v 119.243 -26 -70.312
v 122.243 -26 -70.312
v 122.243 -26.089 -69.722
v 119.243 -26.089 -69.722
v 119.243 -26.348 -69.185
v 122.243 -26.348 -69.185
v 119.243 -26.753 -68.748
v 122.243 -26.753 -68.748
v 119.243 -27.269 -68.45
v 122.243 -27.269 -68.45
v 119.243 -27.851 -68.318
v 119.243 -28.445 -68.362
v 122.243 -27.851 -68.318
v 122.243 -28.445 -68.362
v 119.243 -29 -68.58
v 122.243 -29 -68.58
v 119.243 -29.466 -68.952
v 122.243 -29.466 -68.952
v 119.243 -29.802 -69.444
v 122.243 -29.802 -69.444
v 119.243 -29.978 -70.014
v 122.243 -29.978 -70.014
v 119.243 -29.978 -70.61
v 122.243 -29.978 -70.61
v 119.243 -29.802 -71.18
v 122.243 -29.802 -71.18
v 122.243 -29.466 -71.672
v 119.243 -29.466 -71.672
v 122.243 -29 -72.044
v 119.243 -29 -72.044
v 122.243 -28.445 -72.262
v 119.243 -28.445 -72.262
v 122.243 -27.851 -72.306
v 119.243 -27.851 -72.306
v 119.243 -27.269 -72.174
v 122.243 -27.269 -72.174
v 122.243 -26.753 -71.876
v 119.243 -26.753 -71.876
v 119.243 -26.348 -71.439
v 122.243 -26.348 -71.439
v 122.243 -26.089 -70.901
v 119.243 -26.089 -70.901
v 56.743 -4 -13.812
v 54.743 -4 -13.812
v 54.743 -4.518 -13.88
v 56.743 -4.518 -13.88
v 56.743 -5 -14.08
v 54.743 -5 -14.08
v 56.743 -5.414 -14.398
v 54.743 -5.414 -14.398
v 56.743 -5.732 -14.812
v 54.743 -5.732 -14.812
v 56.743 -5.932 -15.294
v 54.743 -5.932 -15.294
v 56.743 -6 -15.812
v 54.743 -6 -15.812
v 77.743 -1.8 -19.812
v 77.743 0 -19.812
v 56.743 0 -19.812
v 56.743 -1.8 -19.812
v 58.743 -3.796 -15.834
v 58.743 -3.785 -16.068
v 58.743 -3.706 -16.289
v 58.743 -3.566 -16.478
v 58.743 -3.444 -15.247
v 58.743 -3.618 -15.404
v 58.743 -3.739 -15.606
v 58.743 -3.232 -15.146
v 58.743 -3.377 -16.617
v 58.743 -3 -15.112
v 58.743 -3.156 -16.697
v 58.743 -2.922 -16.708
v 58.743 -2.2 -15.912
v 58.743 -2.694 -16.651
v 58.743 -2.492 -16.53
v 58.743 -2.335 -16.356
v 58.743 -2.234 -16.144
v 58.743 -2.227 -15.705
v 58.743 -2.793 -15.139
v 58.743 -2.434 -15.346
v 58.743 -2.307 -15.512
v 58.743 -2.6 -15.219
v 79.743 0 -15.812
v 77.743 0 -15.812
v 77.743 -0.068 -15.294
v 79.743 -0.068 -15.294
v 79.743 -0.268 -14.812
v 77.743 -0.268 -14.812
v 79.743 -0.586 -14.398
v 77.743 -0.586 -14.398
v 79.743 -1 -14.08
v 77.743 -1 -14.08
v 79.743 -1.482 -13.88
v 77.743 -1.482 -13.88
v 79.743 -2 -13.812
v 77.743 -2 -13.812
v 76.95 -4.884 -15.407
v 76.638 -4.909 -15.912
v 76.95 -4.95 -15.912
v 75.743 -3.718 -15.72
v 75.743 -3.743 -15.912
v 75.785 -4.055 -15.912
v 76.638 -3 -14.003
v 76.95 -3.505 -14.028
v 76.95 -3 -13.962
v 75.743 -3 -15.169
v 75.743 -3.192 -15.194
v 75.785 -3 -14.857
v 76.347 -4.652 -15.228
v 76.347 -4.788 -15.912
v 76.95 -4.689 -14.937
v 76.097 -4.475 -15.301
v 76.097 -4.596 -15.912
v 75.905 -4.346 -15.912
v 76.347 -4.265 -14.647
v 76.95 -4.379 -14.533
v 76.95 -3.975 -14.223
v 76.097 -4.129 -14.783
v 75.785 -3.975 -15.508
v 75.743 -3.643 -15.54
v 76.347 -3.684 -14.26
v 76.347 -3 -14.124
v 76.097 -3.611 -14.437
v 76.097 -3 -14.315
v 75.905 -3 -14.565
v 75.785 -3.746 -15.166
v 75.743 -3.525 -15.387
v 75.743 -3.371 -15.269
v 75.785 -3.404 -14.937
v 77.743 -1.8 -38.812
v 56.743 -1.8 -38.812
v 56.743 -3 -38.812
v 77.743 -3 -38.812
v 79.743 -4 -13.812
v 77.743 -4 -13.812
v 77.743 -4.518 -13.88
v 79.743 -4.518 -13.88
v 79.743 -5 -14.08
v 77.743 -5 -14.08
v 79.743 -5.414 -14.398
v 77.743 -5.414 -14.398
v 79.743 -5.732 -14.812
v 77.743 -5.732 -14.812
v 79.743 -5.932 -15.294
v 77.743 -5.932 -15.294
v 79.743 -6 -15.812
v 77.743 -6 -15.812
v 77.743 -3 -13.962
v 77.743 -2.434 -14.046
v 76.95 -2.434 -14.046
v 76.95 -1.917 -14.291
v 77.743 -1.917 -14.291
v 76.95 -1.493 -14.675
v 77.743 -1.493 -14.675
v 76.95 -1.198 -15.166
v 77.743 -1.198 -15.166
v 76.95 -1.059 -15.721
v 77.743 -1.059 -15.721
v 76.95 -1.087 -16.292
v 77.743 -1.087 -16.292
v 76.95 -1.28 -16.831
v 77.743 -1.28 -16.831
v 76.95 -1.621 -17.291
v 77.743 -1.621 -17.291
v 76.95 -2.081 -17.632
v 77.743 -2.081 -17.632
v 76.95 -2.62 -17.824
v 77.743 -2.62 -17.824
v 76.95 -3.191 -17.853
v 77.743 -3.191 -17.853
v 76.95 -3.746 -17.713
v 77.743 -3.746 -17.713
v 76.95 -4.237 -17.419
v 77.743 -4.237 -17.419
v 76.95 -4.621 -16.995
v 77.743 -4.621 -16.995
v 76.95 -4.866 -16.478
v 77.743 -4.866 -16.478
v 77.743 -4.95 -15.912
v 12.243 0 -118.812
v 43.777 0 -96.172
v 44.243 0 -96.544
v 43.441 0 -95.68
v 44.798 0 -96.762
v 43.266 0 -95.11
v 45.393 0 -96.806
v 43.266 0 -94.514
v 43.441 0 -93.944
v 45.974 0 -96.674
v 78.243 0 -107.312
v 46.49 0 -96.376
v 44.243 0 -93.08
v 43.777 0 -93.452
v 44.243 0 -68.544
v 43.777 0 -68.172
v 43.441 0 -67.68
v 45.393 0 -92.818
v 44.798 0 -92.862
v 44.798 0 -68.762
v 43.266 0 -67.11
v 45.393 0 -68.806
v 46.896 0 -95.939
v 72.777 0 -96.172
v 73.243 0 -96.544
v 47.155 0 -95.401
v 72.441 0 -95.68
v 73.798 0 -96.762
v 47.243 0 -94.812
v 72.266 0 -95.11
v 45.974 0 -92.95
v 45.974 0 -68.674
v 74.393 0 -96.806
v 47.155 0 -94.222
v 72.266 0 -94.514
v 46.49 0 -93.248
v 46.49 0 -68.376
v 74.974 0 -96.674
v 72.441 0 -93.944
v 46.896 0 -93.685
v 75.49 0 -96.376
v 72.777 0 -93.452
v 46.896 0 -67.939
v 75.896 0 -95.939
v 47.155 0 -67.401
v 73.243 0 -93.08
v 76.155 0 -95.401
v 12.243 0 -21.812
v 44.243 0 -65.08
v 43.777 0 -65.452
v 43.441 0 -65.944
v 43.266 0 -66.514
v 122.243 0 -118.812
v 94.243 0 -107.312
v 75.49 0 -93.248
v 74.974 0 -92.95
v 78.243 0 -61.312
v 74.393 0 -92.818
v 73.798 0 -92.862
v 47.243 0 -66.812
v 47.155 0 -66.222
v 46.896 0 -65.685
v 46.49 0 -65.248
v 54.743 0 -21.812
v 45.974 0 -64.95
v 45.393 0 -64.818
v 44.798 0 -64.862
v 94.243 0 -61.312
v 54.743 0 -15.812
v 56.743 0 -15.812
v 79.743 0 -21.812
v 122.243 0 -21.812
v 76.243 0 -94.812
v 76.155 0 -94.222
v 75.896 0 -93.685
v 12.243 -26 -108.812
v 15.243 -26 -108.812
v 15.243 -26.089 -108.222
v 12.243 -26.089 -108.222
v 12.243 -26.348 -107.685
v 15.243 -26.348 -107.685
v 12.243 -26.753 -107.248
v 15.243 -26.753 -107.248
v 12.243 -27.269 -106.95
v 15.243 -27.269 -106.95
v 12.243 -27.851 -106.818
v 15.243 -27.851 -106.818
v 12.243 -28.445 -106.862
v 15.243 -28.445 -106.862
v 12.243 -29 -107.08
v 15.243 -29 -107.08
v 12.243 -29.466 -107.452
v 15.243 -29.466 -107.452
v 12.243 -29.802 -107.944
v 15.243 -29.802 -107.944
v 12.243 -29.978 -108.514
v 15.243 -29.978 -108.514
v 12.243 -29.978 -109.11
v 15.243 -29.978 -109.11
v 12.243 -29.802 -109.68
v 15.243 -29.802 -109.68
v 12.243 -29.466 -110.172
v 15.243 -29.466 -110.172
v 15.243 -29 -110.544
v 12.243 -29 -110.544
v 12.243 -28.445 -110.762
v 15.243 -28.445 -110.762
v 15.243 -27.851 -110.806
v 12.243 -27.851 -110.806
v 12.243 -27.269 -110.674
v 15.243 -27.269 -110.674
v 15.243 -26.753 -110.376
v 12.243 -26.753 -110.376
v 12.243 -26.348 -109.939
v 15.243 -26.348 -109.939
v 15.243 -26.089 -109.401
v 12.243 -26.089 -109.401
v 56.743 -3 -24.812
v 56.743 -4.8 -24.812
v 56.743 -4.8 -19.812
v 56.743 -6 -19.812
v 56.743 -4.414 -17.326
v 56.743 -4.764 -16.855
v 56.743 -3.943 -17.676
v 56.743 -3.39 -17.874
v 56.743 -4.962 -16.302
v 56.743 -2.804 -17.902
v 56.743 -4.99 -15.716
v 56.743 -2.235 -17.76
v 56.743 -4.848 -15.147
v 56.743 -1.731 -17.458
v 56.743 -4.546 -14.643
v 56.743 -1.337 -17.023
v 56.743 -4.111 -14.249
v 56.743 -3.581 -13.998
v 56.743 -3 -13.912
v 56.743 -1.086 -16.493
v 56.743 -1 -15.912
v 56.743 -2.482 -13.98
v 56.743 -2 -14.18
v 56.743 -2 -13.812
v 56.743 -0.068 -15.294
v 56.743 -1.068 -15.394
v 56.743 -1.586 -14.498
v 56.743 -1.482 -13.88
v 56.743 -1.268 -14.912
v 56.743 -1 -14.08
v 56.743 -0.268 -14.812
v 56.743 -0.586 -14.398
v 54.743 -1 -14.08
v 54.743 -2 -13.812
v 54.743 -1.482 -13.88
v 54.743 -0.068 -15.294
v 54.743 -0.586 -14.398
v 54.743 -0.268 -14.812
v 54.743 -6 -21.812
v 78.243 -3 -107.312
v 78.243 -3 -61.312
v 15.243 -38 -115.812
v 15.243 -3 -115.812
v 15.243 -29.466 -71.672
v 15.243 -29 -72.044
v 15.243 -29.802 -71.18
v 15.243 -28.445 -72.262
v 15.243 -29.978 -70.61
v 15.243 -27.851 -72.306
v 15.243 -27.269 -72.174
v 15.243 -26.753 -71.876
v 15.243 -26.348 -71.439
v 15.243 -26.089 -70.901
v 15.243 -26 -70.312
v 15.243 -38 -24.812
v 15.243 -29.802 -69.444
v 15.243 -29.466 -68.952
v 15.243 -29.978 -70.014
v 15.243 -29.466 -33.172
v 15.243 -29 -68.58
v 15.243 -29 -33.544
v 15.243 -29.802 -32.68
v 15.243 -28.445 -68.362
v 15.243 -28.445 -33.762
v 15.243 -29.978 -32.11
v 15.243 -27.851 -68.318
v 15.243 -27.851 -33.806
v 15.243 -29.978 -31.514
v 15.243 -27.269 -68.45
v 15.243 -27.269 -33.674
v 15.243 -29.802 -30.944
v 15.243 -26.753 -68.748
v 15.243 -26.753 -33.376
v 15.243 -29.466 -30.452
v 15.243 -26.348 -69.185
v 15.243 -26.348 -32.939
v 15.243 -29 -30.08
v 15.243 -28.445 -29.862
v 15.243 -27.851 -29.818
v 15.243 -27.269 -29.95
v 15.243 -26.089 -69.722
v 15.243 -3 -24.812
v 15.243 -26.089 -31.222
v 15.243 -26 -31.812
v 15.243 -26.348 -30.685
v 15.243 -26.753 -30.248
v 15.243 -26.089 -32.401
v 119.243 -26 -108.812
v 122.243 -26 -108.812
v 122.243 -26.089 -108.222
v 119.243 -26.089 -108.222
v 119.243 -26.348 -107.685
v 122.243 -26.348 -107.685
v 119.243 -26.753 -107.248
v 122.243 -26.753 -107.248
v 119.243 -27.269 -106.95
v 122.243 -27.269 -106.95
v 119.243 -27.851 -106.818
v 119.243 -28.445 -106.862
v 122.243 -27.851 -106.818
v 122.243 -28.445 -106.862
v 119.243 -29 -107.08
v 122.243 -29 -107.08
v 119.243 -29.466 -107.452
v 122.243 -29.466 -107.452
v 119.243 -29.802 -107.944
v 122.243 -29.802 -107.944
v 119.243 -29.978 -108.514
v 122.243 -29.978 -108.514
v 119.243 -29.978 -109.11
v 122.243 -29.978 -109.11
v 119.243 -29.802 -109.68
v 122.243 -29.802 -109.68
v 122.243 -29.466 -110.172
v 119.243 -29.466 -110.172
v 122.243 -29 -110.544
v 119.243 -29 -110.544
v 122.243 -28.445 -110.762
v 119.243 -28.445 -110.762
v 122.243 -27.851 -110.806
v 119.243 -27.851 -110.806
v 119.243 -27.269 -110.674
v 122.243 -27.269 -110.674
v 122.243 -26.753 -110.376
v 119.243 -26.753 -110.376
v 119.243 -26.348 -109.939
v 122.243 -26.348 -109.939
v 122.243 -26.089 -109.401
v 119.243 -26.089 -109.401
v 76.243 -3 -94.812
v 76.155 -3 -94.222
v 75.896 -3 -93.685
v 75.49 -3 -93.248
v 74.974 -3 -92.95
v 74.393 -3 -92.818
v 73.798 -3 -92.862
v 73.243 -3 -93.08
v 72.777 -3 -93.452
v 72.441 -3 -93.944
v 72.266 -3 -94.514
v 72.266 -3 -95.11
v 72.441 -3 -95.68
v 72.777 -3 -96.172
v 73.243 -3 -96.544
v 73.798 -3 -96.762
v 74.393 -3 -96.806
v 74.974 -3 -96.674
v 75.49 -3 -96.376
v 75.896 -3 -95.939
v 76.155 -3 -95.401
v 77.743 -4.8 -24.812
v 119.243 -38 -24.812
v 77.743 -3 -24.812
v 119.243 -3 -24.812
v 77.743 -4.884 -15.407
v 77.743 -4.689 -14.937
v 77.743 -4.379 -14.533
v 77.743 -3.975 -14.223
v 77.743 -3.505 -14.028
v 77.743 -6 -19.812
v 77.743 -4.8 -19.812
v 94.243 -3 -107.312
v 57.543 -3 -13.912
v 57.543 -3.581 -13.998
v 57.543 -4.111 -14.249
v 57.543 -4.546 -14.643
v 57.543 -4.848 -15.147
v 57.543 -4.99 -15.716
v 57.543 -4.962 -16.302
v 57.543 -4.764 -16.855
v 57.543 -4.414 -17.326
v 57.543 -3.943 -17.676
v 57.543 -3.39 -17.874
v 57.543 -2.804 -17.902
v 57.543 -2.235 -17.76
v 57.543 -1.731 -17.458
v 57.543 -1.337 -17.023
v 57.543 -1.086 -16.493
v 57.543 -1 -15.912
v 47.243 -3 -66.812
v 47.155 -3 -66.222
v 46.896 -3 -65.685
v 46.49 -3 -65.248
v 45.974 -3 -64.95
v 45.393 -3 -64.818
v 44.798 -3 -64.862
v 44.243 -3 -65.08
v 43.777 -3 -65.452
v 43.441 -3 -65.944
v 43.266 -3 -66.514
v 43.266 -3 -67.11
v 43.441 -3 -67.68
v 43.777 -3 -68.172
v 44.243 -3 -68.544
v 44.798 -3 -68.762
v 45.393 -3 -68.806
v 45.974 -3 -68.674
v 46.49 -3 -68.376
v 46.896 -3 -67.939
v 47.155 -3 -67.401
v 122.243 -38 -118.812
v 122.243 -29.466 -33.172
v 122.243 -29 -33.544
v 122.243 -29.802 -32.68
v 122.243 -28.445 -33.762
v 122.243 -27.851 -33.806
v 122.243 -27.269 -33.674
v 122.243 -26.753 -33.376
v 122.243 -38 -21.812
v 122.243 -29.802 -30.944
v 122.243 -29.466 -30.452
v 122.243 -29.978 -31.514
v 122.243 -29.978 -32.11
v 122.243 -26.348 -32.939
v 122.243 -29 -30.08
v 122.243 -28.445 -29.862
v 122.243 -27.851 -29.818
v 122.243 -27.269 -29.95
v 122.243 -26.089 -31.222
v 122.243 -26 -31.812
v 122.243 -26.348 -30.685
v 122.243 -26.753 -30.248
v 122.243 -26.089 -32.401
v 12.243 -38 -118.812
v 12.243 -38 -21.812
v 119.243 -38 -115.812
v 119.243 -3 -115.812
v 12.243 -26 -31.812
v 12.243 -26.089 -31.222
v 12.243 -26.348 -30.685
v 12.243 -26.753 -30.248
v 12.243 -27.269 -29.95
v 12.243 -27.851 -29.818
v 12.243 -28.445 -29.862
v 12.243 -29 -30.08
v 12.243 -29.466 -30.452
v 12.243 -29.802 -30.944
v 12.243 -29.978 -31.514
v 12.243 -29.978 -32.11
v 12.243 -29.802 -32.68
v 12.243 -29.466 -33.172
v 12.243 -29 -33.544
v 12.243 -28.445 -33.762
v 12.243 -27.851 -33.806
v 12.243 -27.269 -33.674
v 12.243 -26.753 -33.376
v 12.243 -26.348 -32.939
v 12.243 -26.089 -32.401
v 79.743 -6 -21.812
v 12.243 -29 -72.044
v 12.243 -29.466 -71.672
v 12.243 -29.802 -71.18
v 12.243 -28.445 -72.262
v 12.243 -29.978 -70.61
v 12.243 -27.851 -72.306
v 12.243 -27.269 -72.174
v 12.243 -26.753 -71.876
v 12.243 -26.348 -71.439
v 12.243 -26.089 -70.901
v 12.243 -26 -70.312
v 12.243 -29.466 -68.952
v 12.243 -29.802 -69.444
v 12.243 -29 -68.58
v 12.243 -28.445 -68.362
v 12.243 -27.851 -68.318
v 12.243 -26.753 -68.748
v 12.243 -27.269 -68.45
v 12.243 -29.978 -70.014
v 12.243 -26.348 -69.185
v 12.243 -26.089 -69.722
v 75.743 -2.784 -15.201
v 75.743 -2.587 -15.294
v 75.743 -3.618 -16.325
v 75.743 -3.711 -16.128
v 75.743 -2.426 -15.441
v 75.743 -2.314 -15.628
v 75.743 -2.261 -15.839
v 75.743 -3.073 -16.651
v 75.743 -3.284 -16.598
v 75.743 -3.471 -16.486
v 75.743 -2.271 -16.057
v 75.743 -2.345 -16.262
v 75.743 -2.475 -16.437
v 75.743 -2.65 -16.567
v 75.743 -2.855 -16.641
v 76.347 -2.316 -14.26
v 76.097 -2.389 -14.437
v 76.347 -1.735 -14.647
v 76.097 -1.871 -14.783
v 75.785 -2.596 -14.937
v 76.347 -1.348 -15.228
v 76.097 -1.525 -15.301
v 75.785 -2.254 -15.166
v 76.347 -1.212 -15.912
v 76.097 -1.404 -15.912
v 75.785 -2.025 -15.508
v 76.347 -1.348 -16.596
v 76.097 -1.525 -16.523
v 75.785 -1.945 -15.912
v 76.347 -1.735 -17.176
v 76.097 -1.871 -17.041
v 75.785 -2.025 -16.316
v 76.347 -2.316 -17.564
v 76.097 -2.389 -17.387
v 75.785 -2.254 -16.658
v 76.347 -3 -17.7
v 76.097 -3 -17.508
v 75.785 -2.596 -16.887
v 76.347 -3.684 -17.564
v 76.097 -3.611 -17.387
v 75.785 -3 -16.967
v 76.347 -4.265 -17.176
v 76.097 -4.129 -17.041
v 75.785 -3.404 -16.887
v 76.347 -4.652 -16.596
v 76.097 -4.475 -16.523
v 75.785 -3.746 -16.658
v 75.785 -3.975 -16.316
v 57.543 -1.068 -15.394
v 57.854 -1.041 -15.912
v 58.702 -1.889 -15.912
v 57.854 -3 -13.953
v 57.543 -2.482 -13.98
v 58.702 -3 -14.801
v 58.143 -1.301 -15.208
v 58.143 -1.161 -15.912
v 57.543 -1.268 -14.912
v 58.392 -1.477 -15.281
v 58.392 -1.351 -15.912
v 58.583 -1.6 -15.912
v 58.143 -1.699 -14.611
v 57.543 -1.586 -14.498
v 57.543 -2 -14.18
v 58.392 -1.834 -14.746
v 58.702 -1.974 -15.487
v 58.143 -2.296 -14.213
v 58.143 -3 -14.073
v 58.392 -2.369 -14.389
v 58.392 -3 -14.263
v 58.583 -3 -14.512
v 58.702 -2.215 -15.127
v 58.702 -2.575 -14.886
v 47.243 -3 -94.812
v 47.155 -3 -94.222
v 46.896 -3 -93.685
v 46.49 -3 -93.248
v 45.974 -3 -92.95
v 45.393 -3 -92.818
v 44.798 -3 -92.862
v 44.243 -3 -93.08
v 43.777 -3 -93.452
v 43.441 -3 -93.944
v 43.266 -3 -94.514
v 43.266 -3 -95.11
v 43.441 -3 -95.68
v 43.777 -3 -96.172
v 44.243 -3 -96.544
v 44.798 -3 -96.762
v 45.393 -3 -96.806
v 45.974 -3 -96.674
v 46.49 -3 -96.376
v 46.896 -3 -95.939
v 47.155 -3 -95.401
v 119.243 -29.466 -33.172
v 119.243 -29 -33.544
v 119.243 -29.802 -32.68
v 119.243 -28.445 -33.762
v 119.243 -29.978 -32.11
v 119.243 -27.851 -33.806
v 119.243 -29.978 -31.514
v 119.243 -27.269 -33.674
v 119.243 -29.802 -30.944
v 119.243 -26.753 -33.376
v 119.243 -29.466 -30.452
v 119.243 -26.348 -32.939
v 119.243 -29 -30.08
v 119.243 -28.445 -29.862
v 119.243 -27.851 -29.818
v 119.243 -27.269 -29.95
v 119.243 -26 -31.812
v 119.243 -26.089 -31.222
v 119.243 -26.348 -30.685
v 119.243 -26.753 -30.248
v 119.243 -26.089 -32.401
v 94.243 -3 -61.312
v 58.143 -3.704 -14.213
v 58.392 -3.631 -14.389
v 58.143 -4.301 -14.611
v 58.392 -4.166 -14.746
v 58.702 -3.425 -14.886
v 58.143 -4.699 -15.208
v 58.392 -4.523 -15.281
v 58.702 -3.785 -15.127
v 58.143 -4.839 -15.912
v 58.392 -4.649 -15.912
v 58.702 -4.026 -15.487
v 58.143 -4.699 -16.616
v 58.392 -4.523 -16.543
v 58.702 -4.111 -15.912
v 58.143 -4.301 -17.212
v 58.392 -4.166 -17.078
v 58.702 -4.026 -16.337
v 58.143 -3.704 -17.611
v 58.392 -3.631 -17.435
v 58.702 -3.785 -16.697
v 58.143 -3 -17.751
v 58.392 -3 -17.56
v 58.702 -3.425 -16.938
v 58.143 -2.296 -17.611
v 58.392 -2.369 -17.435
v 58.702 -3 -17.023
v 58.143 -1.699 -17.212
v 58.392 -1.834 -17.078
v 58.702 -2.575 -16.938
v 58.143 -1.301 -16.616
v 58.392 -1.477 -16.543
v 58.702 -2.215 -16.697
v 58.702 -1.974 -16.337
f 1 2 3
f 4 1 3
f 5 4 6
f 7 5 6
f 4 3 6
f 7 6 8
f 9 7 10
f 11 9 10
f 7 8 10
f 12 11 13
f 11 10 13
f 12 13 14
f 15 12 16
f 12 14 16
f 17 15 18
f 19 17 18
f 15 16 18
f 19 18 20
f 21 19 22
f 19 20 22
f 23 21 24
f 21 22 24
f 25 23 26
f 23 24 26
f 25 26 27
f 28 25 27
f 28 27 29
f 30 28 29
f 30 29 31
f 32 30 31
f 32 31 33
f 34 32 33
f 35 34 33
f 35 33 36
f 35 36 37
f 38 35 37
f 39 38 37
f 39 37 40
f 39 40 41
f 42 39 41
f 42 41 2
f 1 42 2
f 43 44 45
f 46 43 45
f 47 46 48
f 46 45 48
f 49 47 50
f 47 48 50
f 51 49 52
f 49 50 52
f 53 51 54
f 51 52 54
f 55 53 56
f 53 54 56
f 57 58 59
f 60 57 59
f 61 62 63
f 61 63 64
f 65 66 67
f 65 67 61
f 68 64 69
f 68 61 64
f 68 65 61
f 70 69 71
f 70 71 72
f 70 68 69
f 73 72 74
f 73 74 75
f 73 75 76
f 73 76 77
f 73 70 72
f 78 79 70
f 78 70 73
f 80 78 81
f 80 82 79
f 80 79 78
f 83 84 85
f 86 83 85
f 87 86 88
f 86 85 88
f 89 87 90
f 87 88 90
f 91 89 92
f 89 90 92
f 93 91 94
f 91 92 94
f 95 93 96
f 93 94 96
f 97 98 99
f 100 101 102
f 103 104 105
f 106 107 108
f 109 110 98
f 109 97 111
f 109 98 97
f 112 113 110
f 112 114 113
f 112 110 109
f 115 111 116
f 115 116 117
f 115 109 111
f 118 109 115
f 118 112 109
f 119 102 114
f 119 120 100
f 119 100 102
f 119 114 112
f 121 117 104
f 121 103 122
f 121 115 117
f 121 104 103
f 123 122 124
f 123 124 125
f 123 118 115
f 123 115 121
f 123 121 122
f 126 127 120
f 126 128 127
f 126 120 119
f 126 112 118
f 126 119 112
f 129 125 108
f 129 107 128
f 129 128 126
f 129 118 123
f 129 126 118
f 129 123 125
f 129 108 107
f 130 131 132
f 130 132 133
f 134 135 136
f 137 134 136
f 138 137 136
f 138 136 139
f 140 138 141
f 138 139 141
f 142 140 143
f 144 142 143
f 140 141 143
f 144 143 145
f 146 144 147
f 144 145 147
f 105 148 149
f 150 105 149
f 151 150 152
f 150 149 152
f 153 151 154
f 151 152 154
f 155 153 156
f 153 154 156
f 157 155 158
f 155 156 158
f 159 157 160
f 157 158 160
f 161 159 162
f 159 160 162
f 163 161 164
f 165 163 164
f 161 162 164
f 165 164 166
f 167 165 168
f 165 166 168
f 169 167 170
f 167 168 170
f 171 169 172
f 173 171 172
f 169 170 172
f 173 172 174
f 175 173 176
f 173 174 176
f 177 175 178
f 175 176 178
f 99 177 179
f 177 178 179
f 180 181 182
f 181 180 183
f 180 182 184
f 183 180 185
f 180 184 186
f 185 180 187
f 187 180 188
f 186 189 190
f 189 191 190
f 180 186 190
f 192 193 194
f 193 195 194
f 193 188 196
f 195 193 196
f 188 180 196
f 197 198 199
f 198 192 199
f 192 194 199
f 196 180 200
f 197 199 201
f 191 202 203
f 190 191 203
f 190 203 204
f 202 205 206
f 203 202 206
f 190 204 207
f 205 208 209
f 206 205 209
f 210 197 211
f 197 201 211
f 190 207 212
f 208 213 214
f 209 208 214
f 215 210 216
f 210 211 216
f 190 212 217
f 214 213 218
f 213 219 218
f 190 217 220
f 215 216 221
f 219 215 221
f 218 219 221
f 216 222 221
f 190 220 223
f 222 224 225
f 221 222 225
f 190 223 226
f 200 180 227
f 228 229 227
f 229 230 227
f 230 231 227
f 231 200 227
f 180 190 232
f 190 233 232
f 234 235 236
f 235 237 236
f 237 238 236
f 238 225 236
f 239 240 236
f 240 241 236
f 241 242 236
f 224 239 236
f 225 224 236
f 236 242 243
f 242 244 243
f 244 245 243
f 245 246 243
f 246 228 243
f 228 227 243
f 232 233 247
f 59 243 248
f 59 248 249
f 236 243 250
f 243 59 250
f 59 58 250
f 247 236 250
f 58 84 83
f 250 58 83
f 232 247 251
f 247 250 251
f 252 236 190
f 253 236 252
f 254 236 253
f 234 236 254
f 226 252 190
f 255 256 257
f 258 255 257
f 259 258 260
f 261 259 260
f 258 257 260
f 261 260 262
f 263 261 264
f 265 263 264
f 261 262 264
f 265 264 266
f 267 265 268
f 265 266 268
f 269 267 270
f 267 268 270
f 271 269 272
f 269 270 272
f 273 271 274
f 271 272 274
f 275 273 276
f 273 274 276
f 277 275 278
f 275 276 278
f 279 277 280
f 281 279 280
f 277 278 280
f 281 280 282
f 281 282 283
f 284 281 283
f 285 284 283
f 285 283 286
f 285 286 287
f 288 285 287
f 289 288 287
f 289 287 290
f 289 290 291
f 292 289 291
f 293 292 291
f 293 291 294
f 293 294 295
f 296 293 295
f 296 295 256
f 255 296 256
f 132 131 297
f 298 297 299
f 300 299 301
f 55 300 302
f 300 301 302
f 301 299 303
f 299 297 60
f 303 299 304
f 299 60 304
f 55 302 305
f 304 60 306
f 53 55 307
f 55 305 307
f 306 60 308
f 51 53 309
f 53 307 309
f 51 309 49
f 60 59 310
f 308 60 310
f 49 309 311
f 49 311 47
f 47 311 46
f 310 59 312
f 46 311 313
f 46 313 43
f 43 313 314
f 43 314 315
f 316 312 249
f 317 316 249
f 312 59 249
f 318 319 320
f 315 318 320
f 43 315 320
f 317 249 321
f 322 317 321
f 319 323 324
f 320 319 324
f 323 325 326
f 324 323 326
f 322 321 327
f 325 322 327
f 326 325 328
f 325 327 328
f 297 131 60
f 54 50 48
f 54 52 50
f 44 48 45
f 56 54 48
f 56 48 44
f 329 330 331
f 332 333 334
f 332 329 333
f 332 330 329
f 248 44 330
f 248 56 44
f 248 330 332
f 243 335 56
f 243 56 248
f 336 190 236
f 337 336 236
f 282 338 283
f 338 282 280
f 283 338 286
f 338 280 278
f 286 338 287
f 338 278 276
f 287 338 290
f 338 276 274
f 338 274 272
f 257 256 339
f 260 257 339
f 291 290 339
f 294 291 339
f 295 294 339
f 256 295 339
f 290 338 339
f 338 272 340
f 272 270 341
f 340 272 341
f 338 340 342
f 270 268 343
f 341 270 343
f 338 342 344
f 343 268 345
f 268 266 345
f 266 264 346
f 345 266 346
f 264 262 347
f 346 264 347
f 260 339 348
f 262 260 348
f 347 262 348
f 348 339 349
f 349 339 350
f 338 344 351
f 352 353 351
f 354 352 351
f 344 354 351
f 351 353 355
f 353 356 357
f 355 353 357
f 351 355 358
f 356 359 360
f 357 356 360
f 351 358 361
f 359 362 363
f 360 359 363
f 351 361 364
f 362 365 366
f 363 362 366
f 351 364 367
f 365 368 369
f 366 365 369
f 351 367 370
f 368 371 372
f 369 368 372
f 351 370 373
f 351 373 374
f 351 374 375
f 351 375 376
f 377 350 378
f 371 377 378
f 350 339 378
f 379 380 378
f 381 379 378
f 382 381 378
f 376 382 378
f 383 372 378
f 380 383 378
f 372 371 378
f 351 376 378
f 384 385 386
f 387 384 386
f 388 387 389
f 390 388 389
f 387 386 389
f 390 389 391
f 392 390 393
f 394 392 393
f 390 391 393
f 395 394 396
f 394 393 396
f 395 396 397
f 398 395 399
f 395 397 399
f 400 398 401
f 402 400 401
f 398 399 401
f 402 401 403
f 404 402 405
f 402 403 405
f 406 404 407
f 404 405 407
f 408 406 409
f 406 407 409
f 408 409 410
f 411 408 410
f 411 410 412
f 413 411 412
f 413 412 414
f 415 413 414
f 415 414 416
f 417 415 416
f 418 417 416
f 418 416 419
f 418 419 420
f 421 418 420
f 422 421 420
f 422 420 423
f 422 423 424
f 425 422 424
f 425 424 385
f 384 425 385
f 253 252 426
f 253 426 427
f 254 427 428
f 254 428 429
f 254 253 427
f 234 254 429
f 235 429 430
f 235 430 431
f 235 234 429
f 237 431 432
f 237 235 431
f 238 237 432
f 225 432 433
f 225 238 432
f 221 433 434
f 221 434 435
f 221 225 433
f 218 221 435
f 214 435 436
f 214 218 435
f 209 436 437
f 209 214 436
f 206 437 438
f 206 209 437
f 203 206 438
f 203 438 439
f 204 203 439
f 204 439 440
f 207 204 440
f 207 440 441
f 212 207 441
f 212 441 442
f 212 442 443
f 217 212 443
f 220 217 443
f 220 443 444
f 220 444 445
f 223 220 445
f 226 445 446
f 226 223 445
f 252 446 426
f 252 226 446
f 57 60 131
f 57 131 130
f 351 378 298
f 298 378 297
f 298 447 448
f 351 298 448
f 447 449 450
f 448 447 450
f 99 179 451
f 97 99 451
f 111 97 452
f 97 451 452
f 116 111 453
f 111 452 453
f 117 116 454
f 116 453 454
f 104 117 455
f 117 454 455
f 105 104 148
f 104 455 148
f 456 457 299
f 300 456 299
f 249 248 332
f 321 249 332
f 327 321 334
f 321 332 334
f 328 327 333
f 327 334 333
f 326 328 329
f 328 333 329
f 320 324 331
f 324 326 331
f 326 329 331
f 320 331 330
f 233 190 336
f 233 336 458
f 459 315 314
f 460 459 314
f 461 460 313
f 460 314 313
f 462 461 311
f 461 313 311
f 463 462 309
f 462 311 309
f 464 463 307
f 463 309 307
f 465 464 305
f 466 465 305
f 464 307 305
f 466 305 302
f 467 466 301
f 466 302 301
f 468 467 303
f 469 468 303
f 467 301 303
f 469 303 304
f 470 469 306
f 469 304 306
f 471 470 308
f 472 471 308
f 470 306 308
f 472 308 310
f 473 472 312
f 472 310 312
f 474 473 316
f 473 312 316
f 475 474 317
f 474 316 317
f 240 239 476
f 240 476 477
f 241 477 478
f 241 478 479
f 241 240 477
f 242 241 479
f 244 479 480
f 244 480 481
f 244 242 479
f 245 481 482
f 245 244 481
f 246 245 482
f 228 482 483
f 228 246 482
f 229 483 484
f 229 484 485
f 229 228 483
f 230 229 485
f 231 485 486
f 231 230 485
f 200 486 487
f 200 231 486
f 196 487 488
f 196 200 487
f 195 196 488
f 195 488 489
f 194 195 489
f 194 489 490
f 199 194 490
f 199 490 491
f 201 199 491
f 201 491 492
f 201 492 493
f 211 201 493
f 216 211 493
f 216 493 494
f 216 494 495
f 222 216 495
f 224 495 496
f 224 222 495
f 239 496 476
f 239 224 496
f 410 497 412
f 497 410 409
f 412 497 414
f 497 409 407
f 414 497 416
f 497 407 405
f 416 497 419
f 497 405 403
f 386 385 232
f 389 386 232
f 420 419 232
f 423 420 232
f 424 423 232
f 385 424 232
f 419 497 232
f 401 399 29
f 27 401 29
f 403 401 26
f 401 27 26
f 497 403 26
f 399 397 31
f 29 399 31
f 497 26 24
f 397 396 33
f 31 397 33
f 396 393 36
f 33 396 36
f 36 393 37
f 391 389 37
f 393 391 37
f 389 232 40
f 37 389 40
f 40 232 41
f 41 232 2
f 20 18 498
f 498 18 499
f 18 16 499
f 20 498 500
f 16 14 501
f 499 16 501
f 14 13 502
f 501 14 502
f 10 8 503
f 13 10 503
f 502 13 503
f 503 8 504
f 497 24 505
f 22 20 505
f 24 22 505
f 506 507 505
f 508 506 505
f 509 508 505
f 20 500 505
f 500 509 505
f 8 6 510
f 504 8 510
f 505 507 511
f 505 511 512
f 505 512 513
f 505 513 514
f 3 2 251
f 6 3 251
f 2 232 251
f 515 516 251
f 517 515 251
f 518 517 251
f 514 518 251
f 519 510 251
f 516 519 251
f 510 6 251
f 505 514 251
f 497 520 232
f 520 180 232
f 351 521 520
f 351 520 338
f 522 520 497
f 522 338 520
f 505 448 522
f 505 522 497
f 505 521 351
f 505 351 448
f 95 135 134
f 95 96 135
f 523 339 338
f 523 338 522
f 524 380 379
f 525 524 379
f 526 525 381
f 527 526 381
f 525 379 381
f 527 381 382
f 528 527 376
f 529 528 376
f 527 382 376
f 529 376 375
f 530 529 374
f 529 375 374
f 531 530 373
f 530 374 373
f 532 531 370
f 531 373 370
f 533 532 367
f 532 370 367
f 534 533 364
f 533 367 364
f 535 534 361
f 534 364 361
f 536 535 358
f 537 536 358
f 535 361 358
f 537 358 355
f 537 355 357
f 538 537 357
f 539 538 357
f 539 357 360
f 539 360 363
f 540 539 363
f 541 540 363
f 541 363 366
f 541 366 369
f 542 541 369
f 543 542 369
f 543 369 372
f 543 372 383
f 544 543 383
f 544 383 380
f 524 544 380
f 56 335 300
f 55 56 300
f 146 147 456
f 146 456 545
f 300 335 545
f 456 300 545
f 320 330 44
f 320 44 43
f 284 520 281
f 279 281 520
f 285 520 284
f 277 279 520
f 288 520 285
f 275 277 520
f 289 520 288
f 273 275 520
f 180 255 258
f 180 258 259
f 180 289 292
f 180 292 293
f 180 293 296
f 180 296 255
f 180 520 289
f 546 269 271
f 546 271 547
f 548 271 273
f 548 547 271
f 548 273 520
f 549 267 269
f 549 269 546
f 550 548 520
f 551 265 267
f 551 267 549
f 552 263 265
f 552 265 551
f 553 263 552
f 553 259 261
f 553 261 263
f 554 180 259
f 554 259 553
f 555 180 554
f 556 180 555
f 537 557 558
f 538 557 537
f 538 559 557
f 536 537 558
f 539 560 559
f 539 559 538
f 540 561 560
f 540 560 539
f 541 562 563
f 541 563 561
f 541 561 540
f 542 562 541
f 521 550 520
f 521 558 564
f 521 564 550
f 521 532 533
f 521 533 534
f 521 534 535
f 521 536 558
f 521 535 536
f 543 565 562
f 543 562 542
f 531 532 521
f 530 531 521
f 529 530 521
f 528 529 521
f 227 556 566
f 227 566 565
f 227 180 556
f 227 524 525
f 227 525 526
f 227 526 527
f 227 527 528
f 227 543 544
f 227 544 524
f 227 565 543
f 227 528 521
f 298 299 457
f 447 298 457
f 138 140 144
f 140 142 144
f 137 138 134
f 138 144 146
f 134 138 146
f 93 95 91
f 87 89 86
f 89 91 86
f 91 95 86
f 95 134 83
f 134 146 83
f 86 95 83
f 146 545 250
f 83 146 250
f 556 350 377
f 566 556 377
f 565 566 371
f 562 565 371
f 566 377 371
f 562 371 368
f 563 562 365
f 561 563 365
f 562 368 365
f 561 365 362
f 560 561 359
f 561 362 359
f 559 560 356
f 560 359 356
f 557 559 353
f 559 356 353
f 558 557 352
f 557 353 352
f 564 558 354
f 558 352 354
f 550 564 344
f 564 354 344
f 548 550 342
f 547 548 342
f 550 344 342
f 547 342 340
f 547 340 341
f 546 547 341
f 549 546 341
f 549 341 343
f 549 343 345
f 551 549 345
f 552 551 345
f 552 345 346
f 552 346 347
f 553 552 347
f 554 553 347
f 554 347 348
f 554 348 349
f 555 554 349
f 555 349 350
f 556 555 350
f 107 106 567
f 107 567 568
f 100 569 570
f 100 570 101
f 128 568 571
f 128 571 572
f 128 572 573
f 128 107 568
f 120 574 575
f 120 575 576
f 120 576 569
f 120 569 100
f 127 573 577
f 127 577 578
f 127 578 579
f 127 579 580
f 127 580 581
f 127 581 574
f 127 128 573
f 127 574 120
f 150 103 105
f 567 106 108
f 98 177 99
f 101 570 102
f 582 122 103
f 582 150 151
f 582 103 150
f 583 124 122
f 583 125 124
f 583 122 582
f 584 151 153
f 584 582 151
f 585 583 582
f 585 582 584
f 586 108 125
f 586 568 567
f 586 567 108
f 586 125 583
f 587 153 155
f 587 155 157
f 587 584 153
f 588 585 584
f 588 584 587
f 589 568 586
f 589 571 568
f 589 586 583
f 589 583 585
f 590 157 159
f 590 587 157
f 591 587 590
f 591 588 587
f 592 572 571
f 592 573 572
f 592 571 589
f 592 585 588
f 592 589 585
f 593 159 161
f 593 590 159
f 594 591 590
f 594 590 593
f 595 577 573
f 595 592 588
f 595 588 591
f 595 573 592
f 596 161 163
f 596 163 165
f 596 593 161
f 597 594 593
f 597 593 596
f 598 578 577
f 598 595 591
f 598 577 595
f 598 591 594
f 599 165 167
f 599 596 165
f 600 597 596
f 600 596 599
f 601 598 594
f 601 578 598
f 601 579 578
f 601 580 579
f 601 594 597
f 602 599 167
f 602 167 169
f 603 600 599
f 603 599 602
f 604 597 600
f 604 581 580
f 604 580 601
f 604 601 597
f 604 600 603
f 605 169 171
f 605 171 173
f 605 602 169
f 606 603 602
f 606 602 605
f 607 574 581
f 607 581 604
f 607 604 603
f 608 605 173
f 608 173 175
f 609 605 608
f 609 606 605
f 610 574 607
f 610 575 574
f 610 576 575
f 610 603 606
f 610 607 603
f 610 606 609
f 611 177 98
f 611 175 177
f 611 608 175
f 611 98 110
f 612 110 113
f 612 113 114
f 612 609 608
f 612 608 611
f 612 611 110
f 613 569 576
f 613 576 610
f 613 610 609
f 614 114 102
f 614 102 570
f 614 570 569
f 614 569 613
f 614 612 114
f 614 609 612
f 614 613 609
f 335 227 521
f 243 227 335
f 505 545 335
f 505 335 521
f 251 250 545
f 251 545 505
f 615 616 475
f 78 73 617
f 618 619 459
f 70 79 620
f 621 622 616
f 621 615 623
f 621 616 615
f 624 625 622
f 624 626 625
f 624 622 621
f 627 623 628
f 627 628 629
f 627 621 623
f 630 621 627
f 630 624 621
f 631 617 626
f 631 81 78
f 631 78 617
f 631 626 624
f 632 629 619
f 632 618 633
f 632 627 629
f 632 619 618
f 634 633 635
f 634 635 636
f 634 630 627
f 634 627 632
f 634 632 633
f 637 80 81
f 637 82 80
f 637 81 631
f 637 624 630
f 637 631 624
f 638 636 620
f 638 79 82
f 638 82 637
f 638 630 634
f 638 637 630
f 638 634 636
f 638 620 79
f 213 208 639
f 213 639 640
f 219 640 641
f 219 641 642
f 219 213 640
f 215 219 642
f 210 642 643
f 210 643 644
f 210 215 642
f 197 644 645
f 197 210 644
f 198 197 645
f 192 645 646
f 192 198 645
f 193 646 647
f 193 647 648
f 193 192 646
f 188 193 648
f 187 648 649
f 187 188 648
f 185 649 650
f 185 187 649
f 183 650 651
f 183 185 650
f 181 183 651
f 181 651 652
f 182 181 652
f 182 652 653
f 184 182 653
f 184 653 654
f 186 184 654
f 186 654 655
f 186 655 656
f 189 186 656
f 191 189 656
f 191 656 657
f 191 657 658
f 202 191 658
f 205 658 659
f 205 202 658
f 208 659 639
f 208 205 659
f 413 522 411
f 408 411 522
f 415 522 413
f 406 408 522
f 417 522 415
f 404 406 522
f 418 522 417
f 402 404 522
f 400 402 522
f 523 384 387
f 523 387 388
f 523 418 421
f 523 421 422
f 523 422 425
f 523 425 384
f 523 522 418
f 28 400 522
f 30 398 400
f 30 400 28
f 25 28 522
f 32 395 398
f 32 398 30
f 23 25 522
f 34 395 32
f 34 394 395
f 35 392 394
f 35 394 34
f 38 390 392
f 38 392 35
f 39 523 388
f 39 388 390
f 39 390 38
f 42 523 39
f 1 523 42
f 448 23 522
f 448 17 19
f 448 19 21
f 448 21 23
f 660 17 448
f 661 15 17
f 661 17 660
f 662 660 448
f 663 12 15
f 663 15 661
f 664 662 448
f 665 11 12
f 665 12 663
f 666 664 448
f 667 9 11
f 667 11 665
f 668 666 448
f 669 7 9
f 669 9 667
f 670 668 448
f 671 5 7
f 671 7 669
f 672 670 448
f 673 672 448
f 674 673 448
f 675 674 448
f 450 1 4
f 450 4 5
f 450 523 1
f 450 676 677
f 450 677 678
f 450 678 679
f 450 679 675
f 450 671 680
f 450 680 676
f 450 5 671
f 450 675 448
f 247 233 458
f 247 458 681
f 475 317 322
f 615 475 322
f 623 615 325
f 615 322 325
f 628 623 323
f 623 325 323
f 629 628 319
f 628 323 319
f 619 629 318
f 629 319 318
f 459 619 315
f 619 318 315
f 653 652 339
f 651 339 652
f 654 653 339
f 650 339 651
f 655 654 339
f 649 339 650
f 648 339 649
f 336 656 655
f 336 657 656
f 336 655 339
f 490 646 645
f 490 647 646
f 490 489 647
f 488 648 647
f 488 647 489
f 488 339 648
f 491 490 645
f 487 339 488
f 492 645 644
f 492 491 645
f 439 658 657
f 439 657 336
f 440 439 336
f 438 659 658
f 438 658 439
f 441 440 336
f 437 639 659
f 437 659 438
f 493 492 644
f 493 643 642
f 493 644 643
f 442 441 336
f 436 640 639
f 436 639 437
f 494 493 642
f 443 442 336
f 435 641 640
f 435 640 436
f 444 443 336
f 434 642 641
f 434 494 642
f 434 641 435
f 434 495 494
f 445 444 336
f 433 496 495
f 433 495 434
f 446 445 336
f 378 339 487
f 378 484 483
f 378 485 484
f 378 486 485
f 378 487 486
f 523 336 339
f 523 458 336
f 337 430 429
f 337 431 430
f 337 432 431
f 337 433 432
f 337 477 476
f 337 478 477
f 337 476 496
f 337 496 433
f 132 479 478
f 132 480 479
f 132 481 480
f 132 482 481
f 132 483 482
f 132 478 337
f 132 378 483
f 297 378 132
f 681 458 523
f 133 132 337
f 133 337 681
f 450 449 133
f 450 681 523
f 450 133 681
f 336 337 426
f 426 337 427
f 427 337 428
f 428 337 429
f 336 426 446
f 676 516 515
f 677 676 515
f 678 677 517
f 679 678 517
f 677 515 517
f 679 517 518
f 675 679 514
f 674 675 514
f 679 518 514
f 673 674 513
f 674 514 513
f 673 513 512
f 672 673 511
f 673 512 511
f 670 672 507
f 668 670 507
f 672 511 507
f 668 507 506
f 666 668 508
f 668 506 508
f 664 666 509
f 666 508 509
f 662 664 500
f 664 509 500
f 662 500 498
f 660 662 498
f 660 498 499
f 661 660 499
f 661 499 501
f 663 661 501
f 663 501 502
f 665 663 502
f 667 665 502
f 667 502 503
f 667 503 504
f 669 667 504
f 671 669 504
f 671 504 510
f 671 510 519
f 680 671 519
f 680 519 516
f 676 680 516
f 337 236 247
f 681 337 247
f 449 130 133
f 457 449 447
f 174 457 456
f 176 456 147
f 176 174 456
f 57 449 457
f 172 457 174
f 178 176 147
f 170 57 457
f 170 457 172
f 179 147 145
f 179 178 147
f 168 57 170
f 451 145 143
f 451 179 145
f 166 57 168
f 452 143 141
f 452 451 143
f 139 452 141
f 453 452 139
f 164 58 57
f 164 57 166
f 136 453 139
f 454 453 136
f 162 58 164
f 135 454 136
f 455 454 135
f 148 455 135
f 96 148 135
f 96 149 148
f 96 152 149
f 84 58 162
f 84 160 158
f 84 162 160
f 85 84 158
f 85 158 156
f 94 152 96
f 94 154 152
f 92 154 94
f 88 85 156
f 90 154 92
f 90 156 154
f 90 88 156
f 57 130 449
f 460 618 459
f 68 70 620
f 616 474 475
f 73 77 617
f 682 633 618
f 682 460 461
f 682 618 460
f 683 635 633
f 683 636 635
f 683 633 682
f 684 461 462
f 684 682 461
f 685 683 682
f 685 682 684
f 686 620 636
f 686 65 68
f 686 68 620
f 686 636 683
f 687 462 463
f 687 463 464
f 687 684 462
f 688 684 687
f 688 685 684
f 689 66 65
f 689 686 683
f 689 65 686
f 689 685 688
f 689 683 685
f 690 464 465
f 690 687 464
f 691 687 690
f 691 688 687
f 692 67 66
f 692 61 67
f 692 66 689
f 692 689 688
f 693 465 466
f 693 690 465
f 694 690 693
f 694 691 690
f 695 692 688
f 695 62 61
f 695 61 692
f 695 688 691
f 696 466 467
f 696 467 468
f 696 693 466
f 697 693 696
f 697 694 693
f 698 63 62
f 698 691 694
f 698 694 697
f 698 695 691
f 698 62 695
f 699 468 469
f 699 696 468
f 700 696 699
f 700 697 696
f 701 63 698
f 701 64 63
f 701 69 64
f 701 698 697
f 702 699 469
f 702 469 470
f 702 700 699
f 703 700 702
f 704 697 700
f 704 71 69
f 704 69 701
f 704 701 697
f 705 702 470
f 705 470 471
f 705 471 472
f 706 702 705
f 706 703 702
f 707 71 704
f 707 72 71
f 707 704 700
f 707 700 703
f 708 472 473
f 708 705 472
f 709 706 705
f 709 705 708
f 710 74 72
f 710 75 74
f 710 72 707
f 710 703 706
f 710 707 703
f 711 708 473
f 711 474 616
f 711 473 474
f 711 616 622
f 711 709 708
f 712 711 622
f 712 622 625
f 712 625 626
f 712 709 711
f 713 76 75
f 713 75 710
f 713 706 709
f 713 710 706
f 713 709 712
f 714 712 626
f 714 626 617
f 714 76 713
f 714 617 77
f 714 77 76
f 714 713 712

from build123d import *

# Parameters (mm, degrees)
F0_W      = 110
F0_H      = 97
F0_R      = 2
F0_W_2    = 16
F0_H_2    = 46
F1_DEPTH  = 3
F2_W      = 22
F2_H      = 1.6
F3_DEPTH  = 1.6
F4_W      = 110
F4_H      = 97
F4_W_2    = 104
F4_H_2    = 91
F5_DEPTH  = 35
F6_W      = 25
F6_H      = 6
F7_DEPTH  = 8
F8_W      = 21
F8_H      = 3
F9_DEPTH  = 25
F11_DEPTH = 25
F12_W     = 21
F12_H     = 6
F13_DEPTH = 7
F15_DEPTH = 2
F16_R     = 1.207107
F18_DEPTH = 2
F19_R     = 1.2
F20_R     = 2
F21_DEPTH = 110.001


with BuildPart() as f1:
    # F0 (on Front) → F1 (new body)
    with BuildSketch(Plane.XZ):
        with Locations((67.24338, -70.311934)):
            Rectangle(F0_W, F0_H)
        with Locations((45.24338, -94.811934)):
            Circle(F0_R, mode=Mode.SUBTRACT)
        with Locations((74.24338, -94.811934)):
            Circle(F0_R, mode=Mode.SUBTRACT)
        with Locations((86.24338, -84.311934)):
            Rectangle(F0_W_2, F0_H_2, mode=Mode.SUBTRACT)
        with Locations((45.24338, -66.811934)):
            Circle(F0_R, mode=Mode.SUBTRACT)
    extrude(amount=F1_DEPTH)

    # F2 (on Front) → F3 (join)
    with BuildSketch(Plane.XZ):
        with Locations((67.24338, -25.611934)):
            Rectangle(F2_W, F2_H)
    extrude(amount=F3_DEPTH)

    # F4 (on face) → F5 (join)
    with BuildSketch(Plane.XZ.offset(3)):
        with Locations((67.24338, -70.311934)):
            Rectangle(F4_W, F4_H)
        with Locations((67.24338, -70.311934)):
            Rectangle(F4_W_2, F4_H_2, mode=Mode.SUBTRACT)
    extrude(amount=F5_DEPTH)

    # F6 (on face) → F7 (join)
    with BuildSketch(Plane.XY.offset(-21.811934)):
        with Locations((67.24338, -3)):
            Rectangle(F6_W, F6_H)
    extrude(amount=F7_DEPTH)

    # F8 (on face) → F9 (cut)
    with BuildSketch(Plane.XY.offset(-13.811934)):
        with Locations((67.24338, -3.3)):
            Rectangle(F8_W, F8_H)
    extrude(amount=-F9_DEPTH, mode=Mode.SUBTRACT)

    # F10 (on face) → F11 (cut)
    with BuildSketch(Plane(origin=(54.74338, 0, 0), x_dir=(0, -1, 0), z_dir=(-1, 0, 0))):
        with BuildLine():
            ThreePointArc((0, -15.811934), (0.585786, -14.397721), (2, -13.811934))
            Line((2, -13.811934), (0, -13.811934))
            Line((0, -13.811934), (0, -15.811934))
        make_face()
        with BuildLine():
            Line((6, -13.811934), (4, -13.811934))
            ThreePointArc((4, -13.811934), (5.414214, -14.397721), (6, -15.811934))
            Line((6, -15.811934), (6, -13.811934))
        make_face()
    extrude(amount=-F11_DEPTH, mode=Mode.SUBTRACT)

    # F12 (on face) → F13 (cut)
    with BuildSketch(Plane(origin=(0, 0, 0), x_dir=(-1, 0, 0), z_dir=(0, 1, 0))):
        with Locations((-67.24338, -16.811934)):
            Rectangle(F12_W, F12_H)
    extrude(amount=-F13_DEPTH, mode=Mode.SUBTRACT)

    # F14 (on face) → F15 (join)
    with BuildSketch(Plane(origin=(77.74338, 0, 0), x_dir=(0, -1, 0), z_dir=(-1, 0, 0))):
        with BuildLine():
            ThreePointArc((3, -13.961934), (1.621142, -17.290793), (4.95, -15.911934))
            ThreePointArc((4.95, -15.911934), (4.378858, -14.533076), (3, -13.961934))
        make_face()
    extrude(amount=F15_DEPTH)

    # F16
    f16_edges = [f1.edges().sort_by_distance(p)[0] for p in [
        (75.74338, -1.05, -15.911934),
    ]]
    fillet(f16_edges, radius=F16_R)

    # F17 (on face) → F18 (join)
    with BuildSketch(Plane.YZ.offset(56.74338)):
        with BuildLine():
            ThreePointArc((-3, -13.911934), (-4.414214, -17.326148), (-1, -15.911934))
            ThreePointArc((-1, -15.911934), (-1.585786, -14.497721), (-3, -13.911934))
        make_face()
    extrude(amount=F18_DEPTH)

    # F19
    f19_edges = [f1.edges().sort_by_distance(p)[0] for p in [
        (58.74338, -5, -15.911934),
    ]]
    fillet(f19_edges, radius=F19_R)

    # F20 (on face) → F21 (cut, through all)
    with BuildSketch(Plane.YZ.offset(122.24338)):
        with Locations((-28, -31.811934)):
            Circle(F20_R)
        with Locations((-28, -108.811934)):
            Circle(F20_R)
        with Locations((-28, -70.311934)):
            Circle(F20_R)
    extrude(amount=-F21_DEPTH, mode=Mode.SUBTRACT)


solid = f1.part
